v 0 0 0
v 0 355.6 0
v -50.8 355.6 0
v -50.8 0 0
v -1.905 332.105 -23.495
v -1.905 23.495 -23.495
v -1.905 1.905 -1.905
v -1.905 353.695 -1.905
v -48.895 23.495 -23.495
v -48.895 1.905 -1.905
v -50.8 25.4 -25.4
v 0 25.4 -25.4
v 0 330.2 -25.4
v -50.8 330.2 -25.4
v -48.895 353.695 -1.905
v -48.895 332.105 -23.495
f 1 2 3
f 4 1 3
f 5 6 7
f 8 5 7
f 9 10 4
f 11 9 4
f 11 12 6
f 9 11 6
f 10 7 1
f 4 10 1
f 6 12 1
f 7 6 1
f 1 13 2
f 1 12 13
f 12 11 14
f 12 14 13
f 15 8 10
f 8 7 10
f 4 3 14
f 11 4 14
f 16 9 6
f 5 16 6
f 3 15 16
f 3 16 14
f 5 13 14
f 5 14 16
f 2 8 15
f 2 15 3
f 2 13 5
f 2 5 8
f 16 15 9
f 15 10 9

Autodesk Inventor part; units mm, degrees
ref_plane "YZ Plane" through (0, 0, 0) normal (1, 0, 0) x (0, 1, 0)
ref_plane "XZ Plane" through (0, 0, 0) normal (0, 1, 0) x (-1, 0, 0)
ref_plane "XY Plane" through (0, 0, 0) normal (0, 0, 1) x (1, 0, 0)
sketch "Sketch1" plane through (0, 0, 0) normal (0, 1, 0) x (-1, 0, 0)
  line L0 (0, 0) -> (50.8, 0)
  line L1 (50.8, 0) -> (50.8, -25.4)
  line L2 (50.8, -25.4) -> (0, -25.4)
  line L3 (0, -25.4) -> (0, 0)
  dimension "d0" = 50.8
  dimension "d1" = 25.4
extrude "Extrusion1" add sketch "Sketch1" along normal blind 355.6
sketch "Sketch3" plane through (0, 0, 0) normal (1, 0, 0) x (0, 0, -1)
  line L0 (25.4, 0) -> (0, 0) projected
  line L1 (25.4, 0) -> (25.4, 25.4)
  line L2 (25.4, 0) -> (25.4, 355.6) projected
  line L3 (0, 0) -> (0, 355.6) projected
  line L4 (25.4, 25.4) -> (0, 0)
  line L5 (0, 177.8) -> (104.5089, 177.8)
  line L6 (0, 0) -> (25.4, 0)
  line L7 (25.4, 355.6) -> (0, 355.6)
  line L8 (25.4, 355.6) -> (25.4, 330.2)
  line L9 (25.4, 330.2) -> (0, 355.6)
  line L10 (0, 355.6) -> (25.4, 355.6)
  dimension "d4" = 25.4
shell "Shell1" thickness 1.905 removed faces 2 at (-16.9333, 0, -16.9333) at (-16.9333, 355.6, -16.9333)
extrude "Extrusion2" cut sketch "Sketch3" against normal blind 355.6 contours L0 L4 L1 | L7 L2 L9
properties part number "graber back peice"
